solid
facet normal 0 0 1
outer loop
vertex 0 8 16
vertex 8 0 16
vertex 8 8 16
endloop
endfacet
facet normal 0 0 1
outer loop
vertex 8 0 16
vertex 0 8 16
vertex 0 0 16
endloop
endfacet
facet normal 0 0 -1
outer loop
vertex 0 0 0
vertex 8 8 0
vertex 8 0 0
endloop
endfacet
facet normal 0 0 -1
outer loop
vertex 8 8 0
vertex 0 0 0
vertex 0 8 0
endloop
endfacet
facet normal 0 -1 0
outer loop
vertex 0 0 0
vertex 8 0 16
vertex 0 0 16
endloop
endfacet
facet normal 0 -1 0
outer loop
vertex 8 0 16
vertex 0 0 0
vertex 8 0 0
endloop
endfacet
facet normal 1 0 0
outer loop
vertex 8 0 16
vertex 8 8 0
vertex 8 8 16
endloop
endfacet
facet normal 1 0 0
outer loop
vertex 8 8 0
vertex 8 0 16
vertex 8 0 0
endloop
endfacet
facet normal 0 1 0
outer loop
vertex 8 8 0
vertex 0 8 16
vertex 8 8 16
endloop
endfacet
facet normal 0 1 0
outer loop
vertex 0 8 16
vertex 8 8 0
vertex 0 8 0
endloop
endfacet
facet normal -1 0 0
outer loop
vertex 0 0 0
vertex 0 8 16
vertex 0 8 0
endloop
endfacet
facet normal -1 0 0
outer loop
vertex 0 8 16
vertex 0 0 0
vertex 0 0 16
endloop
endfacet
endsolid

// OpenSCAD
$fn = 64;

stand_diameter = 8.45 * 25.4;
tree_diameter = 3.6 * 25.4;
printer_bed_size = 220;
spacer_thickness = 6;
support_thickness = 10;
outer_wall_width = 6;
grid_spacing = 12;
grid_line_width = 4;
water_space = 3;
tree_space_camber = 6;
tree_space_support_diameter = 6 * 25.4;

stand_radius = stand_diameter / 2;
tree_radius = tree_diameter / 2;

tree_space_support_radius = tree_space_support_diameter / 2;

hole_size = grid_spacing - grid_line_width;

cube([hole_size, hole_size, support_thickness + spacer_thickness]);
